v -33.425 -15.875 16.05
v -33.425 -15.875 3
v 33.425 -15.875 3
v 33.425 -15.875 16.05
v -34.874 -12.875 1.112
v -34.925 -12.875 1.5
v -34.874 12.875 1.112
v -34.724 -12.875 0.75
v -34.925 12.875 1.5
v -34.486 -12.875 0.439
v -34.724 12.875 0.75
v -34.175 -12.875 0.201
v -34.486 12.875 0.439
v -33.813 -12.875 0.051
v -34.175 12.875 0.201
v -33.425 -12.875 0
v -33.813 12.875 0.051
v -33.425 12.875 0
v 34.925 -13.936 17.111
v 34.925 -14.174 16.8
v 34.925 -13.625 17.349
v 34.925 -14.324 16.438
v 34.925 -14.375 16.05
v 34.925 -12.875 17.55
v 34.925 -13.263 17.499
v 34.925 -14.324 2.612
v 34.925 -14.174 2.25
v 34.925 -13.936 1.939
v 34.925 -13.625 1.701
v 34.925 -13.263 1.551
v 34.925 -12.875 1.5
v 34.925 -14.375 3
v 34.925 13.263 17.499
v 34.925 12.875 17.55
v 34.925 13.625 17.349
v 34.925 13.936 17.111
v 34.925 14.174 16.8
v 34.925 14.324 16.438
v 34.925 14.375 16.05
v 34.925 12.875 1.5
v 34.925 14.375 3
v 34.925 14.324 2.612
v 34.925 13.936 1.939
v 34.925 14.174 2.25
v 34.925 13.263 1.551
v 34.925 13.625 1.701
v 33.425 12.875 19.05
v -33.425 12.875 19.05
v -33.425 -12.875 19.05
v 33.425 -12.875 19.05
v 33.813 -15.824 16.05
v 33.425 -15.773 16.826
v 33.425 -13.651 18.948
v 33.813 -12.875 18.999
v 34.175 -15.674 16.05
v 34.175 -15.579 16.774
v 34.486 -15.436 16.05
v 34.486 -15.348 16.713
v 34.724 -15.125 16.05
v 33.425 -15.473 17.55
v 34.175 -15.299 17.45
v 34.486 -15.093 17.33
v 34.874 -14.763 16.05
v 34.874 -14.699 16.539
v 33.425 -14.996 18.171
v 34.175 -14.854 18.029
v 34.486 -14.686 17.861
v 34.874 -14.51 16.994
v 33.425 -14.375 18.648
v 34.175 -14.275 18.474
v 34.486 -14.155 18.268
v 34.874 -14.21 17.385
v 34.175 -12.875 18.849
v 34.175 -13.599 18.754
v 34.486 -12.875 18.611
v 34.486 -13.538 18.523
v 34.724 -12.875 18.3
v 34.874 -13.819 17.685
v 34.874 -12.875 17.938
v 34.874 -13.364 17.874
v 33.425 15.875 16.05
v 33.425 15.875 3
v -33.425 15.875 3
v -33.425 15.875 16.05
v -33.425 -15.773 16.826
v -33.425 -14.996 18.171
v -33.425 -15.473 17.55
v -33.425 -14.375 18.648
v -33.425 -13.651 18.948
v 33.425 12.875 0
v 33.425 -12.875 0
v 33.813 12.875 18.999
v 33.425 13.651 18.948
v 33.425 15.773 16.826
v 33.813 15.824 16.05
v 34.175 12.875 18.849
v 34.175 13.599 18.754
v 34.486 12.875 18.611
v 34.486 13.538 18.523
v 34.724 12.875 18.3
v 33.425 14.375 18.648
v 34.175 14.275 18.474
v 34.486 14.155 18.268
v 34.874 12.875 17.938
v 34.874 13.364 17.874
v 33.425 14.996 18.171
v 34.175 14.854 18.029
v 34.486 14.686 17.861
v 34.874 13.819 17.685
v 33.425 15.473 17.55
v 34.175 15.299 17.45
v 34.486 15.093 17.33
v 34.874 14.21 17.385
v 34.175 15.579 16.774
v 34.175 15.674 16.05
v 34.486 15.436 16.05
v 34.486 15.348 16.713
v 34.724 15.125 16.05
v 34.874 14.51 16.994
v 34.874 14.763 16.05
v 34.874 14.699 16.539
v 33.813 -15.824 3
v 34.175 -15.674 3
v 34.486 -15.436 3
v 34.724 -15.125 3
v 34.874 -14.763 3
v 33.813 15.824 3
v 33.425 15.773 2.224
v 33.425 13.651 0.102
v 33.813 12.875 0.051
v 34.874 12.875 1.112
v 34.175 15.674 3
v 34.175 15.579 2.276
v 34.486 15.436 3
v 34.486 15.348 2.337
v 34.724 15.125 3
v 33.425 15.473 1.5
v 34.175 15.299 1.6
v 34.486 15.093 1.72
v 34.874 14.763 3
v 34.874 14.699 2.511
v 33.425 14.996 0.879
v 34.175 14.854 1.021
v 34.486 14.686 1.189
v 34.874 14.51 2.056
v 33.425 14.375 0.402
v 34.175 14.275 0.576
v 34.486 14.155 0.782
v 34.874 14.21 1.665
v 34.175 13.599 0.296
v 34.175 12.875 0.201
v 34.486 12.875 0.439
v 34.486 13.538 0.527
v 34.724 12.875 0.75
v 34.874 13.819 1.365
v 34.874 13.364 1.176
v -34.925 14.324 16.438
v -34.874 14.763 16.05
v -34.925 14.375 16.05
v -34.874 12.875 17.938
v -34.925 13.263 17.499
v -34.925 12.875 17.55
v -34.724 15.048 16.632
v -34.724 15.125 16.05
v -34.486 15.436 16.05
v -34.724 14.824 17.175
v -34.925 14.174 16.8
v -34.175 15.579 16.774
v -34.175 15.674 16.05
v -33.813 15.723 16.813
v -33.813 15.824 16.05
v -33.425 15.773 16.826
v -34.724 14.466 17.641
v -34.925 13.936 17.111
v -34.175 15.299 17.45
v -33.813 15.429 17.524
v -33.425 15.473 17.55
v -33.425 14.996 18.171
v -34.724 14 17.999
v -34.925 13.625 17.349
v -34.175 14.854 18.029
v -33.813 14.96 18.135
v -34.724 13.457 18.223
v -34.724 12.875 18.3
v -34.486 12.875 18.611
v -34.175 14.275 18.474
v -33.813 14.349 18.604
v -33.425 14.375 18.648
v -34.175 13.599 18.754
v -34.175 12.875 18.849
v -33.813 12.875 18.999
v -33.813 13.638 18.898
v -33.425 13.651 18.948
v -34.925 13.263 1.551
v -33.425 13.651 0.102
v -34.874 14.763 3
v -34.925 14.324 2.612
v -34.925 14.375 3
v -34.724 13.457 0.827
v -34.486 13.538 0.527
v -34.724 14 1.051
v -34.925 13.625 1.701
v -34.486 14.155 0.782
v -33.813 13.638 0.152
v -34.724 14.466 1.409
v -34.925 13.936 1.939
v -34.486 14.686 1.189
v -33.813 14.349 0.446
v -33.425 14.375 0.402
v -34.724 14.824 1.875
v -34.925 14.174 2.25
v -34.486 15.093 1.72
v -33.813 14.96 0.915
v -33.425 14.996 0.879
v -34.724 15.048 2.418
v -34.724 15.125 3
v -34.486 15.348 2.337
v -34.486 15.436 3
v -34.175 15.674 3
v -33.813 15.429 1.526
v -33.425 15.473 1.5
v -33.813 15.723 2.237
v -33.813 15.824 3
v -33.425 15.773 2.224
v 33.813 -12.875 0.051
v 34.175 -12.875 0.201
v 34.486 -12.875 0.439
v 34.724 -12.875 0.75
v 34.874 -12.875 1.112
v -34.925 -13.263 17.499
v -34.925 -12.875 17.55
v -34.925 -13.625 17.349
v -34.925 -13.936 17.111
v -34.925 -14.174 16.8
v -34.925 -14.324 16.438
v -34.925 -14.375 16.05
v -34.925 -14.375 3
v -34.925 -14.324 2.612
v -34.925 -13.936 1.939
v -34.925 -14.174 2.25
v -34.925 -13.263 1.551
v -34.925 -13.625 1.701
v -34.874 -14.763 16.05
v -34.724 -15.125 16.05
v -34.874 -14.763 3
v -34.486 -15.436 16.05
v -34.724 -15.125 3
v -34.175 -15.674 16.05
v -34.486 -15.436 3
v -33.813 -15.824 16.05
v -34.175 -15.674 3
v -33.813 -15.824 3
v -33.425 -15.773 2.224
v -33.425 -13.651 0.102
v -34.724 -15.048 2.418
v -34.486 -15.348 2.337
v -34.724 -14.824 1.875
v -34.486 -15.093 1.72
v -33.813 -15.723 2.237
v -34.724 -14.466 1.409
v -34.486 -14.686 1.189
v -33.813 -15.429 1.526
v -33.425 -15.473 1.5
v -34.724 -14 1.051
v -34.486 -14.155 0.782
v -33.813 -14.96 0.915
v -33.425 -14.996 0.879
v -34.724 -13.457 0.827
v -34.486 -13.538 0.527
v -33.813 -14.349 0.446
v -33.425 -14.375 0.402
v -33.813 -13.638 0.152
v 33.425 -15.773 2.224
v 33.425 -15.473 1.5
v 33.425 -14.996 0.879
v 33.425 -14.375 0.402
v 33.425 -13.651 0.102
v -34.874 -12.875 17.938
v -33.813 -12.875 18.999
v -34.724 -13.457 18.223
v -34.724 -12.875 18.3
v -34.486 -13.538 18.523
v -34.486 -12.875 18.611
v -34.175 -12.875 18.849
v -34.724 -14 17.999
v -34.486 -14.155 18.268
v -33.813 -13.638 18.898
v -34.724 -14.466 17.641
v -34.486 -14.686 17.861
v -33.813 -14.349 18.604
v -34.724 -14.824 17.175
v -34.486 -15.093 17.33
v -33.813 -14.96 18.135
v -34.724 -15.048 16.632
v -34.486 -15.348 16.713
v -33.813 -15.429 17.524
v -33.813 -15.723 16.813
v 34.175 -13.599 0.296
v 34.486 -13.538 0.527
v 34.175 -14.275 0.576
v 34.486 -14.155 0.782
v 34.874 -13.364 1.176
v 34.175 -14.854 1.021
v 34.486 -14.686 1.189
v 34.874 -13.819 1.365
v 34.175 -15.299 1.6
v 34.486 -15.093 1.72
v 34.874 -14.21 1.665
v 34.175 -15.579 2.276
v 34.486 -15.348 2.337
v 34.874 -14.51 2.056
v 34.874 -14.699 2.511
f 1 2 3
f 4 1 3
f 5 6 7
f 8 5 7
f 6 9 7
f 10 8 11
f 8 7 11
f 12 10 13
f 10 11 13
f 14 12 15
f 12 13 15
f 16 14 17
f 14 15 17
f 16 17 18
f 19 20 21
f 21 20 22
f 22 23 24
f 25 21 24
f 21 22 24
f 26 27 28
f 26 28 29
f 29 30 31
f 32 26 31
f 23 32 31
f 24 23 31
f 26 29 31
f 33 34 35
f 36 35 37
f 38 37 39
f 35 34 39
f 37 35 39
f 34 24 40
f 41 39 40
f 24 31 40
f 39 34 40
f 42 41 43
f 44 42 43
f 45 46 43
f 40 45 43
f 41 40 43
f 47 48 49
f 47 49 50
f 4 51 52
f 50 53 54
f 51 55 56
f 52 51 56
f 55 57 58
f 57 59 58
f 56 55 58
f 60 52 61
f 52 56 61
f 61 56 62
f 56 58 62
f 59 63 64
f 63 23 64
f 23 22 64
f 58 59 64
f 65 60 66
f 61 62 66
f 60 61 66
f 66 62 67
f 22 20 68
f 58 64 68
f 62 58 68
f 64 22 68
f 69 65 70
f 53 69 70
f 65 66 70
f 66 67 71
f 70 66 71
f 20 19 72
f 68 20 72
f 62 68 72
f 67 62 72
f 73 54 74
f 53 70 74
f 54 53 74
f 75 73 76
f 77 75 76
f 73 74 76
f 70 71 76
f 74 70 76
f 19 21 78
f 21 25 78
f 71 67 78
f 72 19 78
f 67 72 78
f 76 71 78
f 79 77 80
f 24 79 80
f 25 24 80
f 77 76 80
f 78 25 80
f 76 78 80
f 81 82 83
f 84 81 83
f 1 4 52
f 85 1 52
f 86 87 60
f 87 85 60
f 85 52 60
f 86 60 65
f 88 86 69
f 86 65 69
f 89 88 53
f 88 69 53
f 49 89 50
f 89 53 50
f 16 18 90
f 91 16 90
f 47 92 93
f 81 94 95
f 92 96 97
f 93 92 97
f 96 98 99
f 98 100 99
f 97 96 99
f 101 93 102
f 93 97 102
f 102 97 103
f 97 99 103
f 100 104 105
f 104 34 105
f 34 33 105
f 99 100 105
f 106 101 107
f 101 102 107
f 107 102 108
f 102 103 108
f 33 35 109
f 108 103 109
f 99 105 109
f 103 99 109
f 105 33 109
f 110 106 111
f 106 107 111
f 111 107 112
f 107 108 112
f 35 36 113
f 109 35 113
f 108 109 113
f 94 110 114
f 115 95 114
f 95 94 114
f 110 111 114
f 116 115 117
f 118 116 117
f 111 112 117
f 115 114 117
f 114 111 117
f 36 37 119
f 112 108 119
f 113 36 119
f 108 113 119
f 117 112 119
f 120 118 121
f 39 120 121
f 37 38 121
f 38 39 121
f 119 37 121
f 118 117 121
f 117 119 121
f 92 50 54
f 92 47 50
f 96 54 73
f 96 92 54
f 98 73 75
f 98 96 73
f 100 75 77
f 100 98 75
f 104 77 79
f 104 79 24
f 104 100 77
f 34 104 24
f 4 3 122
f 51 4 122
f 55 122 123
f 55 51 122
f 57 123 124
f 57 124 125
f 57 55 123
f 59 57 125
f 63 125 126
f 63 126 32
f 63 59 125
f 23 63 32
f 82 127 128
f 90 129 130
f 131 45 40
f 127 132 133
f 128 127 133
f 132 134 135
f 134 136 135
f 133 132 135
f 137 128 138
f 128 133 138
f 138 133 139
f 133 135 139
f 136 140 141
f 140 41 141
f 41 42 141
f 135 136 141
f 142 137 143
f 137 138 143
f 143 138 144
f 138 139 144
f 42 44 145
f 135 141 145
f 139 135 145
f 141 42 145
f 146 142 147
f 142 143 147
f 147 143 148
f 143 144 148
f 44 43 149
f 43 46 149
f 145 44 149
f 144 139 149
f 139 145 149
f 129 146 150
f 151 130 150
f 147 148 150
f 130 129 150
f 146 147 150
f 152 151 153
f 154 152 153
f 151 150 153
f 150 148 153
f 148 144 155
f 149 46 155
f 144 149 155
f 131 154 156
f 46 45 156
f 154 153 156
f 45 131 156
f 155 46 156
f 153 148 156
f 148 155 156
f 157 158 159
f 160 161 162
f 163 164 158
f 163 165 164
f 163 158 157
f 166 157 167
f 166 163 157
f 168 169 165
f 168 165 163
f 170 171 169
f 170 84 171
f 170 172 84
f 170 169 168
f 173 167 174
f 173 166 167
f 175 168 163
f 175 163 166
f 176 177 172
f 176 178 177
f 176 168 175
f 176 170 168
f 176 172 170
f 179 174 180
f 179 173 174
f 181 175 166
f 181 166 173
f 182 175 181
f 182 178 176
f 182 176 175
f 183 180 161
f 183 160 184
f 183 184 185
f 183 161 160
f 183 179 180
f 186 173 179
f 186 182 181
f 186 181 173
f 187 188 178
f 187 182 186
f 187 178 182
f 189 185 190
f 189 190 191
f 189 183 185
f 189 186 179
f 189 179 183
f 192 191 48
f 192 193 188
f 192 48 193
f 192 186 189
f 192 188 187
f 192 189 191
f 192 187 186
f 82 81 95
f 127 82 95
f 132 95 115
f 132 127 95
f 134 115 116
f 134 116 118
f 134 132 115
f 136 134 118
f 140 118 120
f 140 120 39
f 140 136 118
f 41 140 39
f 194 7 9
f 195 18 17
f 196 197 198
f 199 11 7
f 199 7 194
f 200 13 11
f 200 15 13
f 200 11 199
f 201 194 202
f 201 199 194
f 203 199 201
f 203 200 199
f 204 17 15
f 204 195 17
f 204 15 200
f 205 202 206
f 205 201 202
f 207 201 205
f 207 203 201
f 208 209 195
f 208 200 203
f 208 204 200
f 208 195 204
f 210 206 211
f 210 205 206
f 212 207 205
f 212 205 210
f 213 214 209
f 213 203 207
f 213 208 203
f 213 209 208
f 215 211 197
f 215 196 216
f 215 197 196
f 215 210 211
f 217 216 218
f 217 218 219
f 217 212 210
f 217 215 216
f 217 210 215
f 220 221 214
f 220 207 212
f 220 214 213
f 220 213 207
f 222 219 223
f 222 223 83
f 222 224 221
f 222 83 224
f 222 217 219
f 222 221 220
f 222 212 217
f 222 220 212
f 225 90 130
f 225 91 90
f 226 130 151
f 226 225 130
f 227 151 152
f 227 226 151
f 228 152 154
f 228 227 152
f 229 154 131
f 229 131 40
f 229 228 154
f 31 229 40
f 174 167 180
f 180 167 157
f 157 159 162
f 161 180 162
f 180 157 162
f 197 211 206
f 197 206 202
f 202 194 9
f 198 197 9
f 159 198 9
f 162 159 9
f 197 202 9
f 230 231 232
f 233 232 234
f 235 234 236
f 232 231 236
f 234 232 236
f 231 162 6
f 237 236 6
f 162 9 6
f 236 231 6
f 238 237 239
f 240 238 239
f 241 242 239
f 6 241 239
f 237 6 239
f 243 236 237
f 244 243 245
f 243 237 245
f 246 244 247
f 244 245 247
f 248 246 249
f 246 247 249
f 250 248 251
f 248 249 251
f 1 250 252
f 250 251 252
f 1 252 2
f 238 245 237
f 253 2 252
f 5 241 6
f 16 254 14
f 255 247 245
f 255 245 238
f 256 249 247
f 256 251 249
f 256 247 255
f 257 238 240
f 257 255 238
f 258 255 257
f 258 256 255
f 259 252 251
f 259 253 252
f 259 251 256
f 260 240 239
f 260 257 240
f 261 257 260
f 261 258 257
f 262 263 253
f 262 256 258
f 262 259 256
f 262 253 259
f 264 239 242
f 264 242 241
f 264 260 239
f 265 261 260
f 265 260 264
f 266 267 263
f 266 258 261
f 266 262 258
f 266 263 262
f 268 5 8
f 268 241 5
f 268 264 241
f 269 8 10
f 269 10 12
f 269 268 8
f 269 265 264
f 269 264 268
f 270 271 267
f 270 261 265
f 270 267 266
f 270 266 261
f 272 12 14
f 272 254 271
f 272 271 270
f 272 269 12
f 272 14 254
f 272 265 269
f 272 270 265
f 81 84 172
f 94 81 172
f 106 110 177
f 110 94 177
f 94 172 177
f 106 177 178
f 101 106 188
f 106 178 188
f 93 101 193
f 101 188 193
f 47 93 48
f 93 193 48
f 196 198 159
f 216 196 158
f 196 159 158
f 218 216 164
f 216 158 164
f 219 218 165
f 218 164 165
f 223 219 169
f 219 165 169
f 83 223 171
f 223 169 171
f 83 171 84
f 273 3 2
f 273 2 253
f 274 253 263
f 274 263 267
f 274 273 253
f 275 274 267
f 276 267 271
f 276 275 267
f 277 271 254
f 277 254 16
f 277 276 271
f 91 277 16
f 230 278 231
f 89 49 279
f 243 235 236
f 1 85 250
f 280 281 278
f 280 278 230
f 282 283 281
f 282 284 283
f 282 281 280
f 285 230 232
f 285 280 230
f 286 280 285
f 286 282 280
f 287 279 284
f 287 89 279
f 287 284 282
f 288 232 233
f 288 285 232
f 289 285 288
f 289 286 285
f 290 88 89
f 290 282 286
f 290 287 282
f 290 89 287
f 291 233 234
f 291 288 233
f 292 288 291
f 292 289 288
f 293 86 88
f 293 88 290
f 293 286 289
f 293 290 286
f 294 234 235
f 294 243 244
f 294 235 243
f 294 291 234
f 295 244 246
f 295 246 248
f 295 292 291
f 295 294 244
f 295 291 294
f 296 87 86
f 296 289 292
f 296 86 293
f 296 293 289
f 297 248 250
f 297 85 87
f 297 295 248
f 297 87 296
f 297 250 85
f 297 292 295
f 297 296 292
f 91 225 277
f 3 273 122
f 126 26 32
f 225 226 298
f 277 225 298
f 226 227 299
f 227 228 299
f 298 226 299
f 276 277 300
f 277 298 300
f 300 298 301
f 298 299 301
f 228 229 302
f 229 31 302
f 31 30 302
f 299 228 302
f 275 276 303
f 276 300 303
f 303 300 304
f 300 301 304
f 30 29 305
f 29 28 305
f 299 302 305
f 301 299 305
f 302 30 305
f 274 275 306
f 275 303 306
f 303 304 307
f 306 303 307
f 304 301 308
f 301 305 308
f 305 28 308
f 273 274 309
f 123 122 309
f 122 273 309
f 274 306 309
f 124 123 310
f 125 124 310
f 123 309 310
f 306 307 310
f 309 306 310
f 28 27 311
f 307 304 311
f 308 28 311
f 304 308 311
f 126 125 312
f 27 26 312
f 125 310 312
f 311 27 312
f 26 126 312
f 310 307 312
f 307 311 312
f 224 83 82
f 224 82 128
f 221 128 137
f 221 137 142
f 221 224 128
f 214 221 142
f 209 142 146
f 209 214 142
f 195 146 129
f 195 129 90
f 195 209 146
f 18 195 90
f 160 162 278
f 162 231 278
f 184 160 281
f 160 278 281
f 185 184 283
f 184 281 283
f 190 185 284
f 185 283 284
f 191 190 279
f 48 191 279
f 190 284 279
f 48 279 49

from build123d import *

# Parameters (mm, degrees)
F0_W     = 34.925
F0_H     = 15.875
F1_DEPTH = 19.05
F2_R     = 3
F3_R     = 1.5


with BuildPart() as f1:
    # F0 (on Top) → F1 (new body)
    with BuildSketch(Plane.XY):
        with Locations((-17.4625, 7.9375)):
            Rectangle(F0_W, F0_H)
        Polygon((34.925, 15.875), (0, 15.875), (0, 0), (-34.925, 0), (-34.925, -15.875), (34.925, -15.875), align=None)
    extrude(amount=F1_DEPTH)

    # F2
    f2_edges = [f1.edges().sort_by_distance(p)[0] for p in [
        (0, -15.875, 19.05),
        (0, -15.875, 0),
        (0, 15.875, 19.05),
        (0, 15.875, 0),
    ]]
    fillet(f2_edges, radius=F2_R)

    # F3
    f3_edges = [f1.edges().sort_by_distance(p)[0] for p in [
        (-34.925, 0, 19.05),
        (34.925, 0, 19.05),
    ]]
    fillet(f3_edges, radius=F3_R)


solid = f1.part
